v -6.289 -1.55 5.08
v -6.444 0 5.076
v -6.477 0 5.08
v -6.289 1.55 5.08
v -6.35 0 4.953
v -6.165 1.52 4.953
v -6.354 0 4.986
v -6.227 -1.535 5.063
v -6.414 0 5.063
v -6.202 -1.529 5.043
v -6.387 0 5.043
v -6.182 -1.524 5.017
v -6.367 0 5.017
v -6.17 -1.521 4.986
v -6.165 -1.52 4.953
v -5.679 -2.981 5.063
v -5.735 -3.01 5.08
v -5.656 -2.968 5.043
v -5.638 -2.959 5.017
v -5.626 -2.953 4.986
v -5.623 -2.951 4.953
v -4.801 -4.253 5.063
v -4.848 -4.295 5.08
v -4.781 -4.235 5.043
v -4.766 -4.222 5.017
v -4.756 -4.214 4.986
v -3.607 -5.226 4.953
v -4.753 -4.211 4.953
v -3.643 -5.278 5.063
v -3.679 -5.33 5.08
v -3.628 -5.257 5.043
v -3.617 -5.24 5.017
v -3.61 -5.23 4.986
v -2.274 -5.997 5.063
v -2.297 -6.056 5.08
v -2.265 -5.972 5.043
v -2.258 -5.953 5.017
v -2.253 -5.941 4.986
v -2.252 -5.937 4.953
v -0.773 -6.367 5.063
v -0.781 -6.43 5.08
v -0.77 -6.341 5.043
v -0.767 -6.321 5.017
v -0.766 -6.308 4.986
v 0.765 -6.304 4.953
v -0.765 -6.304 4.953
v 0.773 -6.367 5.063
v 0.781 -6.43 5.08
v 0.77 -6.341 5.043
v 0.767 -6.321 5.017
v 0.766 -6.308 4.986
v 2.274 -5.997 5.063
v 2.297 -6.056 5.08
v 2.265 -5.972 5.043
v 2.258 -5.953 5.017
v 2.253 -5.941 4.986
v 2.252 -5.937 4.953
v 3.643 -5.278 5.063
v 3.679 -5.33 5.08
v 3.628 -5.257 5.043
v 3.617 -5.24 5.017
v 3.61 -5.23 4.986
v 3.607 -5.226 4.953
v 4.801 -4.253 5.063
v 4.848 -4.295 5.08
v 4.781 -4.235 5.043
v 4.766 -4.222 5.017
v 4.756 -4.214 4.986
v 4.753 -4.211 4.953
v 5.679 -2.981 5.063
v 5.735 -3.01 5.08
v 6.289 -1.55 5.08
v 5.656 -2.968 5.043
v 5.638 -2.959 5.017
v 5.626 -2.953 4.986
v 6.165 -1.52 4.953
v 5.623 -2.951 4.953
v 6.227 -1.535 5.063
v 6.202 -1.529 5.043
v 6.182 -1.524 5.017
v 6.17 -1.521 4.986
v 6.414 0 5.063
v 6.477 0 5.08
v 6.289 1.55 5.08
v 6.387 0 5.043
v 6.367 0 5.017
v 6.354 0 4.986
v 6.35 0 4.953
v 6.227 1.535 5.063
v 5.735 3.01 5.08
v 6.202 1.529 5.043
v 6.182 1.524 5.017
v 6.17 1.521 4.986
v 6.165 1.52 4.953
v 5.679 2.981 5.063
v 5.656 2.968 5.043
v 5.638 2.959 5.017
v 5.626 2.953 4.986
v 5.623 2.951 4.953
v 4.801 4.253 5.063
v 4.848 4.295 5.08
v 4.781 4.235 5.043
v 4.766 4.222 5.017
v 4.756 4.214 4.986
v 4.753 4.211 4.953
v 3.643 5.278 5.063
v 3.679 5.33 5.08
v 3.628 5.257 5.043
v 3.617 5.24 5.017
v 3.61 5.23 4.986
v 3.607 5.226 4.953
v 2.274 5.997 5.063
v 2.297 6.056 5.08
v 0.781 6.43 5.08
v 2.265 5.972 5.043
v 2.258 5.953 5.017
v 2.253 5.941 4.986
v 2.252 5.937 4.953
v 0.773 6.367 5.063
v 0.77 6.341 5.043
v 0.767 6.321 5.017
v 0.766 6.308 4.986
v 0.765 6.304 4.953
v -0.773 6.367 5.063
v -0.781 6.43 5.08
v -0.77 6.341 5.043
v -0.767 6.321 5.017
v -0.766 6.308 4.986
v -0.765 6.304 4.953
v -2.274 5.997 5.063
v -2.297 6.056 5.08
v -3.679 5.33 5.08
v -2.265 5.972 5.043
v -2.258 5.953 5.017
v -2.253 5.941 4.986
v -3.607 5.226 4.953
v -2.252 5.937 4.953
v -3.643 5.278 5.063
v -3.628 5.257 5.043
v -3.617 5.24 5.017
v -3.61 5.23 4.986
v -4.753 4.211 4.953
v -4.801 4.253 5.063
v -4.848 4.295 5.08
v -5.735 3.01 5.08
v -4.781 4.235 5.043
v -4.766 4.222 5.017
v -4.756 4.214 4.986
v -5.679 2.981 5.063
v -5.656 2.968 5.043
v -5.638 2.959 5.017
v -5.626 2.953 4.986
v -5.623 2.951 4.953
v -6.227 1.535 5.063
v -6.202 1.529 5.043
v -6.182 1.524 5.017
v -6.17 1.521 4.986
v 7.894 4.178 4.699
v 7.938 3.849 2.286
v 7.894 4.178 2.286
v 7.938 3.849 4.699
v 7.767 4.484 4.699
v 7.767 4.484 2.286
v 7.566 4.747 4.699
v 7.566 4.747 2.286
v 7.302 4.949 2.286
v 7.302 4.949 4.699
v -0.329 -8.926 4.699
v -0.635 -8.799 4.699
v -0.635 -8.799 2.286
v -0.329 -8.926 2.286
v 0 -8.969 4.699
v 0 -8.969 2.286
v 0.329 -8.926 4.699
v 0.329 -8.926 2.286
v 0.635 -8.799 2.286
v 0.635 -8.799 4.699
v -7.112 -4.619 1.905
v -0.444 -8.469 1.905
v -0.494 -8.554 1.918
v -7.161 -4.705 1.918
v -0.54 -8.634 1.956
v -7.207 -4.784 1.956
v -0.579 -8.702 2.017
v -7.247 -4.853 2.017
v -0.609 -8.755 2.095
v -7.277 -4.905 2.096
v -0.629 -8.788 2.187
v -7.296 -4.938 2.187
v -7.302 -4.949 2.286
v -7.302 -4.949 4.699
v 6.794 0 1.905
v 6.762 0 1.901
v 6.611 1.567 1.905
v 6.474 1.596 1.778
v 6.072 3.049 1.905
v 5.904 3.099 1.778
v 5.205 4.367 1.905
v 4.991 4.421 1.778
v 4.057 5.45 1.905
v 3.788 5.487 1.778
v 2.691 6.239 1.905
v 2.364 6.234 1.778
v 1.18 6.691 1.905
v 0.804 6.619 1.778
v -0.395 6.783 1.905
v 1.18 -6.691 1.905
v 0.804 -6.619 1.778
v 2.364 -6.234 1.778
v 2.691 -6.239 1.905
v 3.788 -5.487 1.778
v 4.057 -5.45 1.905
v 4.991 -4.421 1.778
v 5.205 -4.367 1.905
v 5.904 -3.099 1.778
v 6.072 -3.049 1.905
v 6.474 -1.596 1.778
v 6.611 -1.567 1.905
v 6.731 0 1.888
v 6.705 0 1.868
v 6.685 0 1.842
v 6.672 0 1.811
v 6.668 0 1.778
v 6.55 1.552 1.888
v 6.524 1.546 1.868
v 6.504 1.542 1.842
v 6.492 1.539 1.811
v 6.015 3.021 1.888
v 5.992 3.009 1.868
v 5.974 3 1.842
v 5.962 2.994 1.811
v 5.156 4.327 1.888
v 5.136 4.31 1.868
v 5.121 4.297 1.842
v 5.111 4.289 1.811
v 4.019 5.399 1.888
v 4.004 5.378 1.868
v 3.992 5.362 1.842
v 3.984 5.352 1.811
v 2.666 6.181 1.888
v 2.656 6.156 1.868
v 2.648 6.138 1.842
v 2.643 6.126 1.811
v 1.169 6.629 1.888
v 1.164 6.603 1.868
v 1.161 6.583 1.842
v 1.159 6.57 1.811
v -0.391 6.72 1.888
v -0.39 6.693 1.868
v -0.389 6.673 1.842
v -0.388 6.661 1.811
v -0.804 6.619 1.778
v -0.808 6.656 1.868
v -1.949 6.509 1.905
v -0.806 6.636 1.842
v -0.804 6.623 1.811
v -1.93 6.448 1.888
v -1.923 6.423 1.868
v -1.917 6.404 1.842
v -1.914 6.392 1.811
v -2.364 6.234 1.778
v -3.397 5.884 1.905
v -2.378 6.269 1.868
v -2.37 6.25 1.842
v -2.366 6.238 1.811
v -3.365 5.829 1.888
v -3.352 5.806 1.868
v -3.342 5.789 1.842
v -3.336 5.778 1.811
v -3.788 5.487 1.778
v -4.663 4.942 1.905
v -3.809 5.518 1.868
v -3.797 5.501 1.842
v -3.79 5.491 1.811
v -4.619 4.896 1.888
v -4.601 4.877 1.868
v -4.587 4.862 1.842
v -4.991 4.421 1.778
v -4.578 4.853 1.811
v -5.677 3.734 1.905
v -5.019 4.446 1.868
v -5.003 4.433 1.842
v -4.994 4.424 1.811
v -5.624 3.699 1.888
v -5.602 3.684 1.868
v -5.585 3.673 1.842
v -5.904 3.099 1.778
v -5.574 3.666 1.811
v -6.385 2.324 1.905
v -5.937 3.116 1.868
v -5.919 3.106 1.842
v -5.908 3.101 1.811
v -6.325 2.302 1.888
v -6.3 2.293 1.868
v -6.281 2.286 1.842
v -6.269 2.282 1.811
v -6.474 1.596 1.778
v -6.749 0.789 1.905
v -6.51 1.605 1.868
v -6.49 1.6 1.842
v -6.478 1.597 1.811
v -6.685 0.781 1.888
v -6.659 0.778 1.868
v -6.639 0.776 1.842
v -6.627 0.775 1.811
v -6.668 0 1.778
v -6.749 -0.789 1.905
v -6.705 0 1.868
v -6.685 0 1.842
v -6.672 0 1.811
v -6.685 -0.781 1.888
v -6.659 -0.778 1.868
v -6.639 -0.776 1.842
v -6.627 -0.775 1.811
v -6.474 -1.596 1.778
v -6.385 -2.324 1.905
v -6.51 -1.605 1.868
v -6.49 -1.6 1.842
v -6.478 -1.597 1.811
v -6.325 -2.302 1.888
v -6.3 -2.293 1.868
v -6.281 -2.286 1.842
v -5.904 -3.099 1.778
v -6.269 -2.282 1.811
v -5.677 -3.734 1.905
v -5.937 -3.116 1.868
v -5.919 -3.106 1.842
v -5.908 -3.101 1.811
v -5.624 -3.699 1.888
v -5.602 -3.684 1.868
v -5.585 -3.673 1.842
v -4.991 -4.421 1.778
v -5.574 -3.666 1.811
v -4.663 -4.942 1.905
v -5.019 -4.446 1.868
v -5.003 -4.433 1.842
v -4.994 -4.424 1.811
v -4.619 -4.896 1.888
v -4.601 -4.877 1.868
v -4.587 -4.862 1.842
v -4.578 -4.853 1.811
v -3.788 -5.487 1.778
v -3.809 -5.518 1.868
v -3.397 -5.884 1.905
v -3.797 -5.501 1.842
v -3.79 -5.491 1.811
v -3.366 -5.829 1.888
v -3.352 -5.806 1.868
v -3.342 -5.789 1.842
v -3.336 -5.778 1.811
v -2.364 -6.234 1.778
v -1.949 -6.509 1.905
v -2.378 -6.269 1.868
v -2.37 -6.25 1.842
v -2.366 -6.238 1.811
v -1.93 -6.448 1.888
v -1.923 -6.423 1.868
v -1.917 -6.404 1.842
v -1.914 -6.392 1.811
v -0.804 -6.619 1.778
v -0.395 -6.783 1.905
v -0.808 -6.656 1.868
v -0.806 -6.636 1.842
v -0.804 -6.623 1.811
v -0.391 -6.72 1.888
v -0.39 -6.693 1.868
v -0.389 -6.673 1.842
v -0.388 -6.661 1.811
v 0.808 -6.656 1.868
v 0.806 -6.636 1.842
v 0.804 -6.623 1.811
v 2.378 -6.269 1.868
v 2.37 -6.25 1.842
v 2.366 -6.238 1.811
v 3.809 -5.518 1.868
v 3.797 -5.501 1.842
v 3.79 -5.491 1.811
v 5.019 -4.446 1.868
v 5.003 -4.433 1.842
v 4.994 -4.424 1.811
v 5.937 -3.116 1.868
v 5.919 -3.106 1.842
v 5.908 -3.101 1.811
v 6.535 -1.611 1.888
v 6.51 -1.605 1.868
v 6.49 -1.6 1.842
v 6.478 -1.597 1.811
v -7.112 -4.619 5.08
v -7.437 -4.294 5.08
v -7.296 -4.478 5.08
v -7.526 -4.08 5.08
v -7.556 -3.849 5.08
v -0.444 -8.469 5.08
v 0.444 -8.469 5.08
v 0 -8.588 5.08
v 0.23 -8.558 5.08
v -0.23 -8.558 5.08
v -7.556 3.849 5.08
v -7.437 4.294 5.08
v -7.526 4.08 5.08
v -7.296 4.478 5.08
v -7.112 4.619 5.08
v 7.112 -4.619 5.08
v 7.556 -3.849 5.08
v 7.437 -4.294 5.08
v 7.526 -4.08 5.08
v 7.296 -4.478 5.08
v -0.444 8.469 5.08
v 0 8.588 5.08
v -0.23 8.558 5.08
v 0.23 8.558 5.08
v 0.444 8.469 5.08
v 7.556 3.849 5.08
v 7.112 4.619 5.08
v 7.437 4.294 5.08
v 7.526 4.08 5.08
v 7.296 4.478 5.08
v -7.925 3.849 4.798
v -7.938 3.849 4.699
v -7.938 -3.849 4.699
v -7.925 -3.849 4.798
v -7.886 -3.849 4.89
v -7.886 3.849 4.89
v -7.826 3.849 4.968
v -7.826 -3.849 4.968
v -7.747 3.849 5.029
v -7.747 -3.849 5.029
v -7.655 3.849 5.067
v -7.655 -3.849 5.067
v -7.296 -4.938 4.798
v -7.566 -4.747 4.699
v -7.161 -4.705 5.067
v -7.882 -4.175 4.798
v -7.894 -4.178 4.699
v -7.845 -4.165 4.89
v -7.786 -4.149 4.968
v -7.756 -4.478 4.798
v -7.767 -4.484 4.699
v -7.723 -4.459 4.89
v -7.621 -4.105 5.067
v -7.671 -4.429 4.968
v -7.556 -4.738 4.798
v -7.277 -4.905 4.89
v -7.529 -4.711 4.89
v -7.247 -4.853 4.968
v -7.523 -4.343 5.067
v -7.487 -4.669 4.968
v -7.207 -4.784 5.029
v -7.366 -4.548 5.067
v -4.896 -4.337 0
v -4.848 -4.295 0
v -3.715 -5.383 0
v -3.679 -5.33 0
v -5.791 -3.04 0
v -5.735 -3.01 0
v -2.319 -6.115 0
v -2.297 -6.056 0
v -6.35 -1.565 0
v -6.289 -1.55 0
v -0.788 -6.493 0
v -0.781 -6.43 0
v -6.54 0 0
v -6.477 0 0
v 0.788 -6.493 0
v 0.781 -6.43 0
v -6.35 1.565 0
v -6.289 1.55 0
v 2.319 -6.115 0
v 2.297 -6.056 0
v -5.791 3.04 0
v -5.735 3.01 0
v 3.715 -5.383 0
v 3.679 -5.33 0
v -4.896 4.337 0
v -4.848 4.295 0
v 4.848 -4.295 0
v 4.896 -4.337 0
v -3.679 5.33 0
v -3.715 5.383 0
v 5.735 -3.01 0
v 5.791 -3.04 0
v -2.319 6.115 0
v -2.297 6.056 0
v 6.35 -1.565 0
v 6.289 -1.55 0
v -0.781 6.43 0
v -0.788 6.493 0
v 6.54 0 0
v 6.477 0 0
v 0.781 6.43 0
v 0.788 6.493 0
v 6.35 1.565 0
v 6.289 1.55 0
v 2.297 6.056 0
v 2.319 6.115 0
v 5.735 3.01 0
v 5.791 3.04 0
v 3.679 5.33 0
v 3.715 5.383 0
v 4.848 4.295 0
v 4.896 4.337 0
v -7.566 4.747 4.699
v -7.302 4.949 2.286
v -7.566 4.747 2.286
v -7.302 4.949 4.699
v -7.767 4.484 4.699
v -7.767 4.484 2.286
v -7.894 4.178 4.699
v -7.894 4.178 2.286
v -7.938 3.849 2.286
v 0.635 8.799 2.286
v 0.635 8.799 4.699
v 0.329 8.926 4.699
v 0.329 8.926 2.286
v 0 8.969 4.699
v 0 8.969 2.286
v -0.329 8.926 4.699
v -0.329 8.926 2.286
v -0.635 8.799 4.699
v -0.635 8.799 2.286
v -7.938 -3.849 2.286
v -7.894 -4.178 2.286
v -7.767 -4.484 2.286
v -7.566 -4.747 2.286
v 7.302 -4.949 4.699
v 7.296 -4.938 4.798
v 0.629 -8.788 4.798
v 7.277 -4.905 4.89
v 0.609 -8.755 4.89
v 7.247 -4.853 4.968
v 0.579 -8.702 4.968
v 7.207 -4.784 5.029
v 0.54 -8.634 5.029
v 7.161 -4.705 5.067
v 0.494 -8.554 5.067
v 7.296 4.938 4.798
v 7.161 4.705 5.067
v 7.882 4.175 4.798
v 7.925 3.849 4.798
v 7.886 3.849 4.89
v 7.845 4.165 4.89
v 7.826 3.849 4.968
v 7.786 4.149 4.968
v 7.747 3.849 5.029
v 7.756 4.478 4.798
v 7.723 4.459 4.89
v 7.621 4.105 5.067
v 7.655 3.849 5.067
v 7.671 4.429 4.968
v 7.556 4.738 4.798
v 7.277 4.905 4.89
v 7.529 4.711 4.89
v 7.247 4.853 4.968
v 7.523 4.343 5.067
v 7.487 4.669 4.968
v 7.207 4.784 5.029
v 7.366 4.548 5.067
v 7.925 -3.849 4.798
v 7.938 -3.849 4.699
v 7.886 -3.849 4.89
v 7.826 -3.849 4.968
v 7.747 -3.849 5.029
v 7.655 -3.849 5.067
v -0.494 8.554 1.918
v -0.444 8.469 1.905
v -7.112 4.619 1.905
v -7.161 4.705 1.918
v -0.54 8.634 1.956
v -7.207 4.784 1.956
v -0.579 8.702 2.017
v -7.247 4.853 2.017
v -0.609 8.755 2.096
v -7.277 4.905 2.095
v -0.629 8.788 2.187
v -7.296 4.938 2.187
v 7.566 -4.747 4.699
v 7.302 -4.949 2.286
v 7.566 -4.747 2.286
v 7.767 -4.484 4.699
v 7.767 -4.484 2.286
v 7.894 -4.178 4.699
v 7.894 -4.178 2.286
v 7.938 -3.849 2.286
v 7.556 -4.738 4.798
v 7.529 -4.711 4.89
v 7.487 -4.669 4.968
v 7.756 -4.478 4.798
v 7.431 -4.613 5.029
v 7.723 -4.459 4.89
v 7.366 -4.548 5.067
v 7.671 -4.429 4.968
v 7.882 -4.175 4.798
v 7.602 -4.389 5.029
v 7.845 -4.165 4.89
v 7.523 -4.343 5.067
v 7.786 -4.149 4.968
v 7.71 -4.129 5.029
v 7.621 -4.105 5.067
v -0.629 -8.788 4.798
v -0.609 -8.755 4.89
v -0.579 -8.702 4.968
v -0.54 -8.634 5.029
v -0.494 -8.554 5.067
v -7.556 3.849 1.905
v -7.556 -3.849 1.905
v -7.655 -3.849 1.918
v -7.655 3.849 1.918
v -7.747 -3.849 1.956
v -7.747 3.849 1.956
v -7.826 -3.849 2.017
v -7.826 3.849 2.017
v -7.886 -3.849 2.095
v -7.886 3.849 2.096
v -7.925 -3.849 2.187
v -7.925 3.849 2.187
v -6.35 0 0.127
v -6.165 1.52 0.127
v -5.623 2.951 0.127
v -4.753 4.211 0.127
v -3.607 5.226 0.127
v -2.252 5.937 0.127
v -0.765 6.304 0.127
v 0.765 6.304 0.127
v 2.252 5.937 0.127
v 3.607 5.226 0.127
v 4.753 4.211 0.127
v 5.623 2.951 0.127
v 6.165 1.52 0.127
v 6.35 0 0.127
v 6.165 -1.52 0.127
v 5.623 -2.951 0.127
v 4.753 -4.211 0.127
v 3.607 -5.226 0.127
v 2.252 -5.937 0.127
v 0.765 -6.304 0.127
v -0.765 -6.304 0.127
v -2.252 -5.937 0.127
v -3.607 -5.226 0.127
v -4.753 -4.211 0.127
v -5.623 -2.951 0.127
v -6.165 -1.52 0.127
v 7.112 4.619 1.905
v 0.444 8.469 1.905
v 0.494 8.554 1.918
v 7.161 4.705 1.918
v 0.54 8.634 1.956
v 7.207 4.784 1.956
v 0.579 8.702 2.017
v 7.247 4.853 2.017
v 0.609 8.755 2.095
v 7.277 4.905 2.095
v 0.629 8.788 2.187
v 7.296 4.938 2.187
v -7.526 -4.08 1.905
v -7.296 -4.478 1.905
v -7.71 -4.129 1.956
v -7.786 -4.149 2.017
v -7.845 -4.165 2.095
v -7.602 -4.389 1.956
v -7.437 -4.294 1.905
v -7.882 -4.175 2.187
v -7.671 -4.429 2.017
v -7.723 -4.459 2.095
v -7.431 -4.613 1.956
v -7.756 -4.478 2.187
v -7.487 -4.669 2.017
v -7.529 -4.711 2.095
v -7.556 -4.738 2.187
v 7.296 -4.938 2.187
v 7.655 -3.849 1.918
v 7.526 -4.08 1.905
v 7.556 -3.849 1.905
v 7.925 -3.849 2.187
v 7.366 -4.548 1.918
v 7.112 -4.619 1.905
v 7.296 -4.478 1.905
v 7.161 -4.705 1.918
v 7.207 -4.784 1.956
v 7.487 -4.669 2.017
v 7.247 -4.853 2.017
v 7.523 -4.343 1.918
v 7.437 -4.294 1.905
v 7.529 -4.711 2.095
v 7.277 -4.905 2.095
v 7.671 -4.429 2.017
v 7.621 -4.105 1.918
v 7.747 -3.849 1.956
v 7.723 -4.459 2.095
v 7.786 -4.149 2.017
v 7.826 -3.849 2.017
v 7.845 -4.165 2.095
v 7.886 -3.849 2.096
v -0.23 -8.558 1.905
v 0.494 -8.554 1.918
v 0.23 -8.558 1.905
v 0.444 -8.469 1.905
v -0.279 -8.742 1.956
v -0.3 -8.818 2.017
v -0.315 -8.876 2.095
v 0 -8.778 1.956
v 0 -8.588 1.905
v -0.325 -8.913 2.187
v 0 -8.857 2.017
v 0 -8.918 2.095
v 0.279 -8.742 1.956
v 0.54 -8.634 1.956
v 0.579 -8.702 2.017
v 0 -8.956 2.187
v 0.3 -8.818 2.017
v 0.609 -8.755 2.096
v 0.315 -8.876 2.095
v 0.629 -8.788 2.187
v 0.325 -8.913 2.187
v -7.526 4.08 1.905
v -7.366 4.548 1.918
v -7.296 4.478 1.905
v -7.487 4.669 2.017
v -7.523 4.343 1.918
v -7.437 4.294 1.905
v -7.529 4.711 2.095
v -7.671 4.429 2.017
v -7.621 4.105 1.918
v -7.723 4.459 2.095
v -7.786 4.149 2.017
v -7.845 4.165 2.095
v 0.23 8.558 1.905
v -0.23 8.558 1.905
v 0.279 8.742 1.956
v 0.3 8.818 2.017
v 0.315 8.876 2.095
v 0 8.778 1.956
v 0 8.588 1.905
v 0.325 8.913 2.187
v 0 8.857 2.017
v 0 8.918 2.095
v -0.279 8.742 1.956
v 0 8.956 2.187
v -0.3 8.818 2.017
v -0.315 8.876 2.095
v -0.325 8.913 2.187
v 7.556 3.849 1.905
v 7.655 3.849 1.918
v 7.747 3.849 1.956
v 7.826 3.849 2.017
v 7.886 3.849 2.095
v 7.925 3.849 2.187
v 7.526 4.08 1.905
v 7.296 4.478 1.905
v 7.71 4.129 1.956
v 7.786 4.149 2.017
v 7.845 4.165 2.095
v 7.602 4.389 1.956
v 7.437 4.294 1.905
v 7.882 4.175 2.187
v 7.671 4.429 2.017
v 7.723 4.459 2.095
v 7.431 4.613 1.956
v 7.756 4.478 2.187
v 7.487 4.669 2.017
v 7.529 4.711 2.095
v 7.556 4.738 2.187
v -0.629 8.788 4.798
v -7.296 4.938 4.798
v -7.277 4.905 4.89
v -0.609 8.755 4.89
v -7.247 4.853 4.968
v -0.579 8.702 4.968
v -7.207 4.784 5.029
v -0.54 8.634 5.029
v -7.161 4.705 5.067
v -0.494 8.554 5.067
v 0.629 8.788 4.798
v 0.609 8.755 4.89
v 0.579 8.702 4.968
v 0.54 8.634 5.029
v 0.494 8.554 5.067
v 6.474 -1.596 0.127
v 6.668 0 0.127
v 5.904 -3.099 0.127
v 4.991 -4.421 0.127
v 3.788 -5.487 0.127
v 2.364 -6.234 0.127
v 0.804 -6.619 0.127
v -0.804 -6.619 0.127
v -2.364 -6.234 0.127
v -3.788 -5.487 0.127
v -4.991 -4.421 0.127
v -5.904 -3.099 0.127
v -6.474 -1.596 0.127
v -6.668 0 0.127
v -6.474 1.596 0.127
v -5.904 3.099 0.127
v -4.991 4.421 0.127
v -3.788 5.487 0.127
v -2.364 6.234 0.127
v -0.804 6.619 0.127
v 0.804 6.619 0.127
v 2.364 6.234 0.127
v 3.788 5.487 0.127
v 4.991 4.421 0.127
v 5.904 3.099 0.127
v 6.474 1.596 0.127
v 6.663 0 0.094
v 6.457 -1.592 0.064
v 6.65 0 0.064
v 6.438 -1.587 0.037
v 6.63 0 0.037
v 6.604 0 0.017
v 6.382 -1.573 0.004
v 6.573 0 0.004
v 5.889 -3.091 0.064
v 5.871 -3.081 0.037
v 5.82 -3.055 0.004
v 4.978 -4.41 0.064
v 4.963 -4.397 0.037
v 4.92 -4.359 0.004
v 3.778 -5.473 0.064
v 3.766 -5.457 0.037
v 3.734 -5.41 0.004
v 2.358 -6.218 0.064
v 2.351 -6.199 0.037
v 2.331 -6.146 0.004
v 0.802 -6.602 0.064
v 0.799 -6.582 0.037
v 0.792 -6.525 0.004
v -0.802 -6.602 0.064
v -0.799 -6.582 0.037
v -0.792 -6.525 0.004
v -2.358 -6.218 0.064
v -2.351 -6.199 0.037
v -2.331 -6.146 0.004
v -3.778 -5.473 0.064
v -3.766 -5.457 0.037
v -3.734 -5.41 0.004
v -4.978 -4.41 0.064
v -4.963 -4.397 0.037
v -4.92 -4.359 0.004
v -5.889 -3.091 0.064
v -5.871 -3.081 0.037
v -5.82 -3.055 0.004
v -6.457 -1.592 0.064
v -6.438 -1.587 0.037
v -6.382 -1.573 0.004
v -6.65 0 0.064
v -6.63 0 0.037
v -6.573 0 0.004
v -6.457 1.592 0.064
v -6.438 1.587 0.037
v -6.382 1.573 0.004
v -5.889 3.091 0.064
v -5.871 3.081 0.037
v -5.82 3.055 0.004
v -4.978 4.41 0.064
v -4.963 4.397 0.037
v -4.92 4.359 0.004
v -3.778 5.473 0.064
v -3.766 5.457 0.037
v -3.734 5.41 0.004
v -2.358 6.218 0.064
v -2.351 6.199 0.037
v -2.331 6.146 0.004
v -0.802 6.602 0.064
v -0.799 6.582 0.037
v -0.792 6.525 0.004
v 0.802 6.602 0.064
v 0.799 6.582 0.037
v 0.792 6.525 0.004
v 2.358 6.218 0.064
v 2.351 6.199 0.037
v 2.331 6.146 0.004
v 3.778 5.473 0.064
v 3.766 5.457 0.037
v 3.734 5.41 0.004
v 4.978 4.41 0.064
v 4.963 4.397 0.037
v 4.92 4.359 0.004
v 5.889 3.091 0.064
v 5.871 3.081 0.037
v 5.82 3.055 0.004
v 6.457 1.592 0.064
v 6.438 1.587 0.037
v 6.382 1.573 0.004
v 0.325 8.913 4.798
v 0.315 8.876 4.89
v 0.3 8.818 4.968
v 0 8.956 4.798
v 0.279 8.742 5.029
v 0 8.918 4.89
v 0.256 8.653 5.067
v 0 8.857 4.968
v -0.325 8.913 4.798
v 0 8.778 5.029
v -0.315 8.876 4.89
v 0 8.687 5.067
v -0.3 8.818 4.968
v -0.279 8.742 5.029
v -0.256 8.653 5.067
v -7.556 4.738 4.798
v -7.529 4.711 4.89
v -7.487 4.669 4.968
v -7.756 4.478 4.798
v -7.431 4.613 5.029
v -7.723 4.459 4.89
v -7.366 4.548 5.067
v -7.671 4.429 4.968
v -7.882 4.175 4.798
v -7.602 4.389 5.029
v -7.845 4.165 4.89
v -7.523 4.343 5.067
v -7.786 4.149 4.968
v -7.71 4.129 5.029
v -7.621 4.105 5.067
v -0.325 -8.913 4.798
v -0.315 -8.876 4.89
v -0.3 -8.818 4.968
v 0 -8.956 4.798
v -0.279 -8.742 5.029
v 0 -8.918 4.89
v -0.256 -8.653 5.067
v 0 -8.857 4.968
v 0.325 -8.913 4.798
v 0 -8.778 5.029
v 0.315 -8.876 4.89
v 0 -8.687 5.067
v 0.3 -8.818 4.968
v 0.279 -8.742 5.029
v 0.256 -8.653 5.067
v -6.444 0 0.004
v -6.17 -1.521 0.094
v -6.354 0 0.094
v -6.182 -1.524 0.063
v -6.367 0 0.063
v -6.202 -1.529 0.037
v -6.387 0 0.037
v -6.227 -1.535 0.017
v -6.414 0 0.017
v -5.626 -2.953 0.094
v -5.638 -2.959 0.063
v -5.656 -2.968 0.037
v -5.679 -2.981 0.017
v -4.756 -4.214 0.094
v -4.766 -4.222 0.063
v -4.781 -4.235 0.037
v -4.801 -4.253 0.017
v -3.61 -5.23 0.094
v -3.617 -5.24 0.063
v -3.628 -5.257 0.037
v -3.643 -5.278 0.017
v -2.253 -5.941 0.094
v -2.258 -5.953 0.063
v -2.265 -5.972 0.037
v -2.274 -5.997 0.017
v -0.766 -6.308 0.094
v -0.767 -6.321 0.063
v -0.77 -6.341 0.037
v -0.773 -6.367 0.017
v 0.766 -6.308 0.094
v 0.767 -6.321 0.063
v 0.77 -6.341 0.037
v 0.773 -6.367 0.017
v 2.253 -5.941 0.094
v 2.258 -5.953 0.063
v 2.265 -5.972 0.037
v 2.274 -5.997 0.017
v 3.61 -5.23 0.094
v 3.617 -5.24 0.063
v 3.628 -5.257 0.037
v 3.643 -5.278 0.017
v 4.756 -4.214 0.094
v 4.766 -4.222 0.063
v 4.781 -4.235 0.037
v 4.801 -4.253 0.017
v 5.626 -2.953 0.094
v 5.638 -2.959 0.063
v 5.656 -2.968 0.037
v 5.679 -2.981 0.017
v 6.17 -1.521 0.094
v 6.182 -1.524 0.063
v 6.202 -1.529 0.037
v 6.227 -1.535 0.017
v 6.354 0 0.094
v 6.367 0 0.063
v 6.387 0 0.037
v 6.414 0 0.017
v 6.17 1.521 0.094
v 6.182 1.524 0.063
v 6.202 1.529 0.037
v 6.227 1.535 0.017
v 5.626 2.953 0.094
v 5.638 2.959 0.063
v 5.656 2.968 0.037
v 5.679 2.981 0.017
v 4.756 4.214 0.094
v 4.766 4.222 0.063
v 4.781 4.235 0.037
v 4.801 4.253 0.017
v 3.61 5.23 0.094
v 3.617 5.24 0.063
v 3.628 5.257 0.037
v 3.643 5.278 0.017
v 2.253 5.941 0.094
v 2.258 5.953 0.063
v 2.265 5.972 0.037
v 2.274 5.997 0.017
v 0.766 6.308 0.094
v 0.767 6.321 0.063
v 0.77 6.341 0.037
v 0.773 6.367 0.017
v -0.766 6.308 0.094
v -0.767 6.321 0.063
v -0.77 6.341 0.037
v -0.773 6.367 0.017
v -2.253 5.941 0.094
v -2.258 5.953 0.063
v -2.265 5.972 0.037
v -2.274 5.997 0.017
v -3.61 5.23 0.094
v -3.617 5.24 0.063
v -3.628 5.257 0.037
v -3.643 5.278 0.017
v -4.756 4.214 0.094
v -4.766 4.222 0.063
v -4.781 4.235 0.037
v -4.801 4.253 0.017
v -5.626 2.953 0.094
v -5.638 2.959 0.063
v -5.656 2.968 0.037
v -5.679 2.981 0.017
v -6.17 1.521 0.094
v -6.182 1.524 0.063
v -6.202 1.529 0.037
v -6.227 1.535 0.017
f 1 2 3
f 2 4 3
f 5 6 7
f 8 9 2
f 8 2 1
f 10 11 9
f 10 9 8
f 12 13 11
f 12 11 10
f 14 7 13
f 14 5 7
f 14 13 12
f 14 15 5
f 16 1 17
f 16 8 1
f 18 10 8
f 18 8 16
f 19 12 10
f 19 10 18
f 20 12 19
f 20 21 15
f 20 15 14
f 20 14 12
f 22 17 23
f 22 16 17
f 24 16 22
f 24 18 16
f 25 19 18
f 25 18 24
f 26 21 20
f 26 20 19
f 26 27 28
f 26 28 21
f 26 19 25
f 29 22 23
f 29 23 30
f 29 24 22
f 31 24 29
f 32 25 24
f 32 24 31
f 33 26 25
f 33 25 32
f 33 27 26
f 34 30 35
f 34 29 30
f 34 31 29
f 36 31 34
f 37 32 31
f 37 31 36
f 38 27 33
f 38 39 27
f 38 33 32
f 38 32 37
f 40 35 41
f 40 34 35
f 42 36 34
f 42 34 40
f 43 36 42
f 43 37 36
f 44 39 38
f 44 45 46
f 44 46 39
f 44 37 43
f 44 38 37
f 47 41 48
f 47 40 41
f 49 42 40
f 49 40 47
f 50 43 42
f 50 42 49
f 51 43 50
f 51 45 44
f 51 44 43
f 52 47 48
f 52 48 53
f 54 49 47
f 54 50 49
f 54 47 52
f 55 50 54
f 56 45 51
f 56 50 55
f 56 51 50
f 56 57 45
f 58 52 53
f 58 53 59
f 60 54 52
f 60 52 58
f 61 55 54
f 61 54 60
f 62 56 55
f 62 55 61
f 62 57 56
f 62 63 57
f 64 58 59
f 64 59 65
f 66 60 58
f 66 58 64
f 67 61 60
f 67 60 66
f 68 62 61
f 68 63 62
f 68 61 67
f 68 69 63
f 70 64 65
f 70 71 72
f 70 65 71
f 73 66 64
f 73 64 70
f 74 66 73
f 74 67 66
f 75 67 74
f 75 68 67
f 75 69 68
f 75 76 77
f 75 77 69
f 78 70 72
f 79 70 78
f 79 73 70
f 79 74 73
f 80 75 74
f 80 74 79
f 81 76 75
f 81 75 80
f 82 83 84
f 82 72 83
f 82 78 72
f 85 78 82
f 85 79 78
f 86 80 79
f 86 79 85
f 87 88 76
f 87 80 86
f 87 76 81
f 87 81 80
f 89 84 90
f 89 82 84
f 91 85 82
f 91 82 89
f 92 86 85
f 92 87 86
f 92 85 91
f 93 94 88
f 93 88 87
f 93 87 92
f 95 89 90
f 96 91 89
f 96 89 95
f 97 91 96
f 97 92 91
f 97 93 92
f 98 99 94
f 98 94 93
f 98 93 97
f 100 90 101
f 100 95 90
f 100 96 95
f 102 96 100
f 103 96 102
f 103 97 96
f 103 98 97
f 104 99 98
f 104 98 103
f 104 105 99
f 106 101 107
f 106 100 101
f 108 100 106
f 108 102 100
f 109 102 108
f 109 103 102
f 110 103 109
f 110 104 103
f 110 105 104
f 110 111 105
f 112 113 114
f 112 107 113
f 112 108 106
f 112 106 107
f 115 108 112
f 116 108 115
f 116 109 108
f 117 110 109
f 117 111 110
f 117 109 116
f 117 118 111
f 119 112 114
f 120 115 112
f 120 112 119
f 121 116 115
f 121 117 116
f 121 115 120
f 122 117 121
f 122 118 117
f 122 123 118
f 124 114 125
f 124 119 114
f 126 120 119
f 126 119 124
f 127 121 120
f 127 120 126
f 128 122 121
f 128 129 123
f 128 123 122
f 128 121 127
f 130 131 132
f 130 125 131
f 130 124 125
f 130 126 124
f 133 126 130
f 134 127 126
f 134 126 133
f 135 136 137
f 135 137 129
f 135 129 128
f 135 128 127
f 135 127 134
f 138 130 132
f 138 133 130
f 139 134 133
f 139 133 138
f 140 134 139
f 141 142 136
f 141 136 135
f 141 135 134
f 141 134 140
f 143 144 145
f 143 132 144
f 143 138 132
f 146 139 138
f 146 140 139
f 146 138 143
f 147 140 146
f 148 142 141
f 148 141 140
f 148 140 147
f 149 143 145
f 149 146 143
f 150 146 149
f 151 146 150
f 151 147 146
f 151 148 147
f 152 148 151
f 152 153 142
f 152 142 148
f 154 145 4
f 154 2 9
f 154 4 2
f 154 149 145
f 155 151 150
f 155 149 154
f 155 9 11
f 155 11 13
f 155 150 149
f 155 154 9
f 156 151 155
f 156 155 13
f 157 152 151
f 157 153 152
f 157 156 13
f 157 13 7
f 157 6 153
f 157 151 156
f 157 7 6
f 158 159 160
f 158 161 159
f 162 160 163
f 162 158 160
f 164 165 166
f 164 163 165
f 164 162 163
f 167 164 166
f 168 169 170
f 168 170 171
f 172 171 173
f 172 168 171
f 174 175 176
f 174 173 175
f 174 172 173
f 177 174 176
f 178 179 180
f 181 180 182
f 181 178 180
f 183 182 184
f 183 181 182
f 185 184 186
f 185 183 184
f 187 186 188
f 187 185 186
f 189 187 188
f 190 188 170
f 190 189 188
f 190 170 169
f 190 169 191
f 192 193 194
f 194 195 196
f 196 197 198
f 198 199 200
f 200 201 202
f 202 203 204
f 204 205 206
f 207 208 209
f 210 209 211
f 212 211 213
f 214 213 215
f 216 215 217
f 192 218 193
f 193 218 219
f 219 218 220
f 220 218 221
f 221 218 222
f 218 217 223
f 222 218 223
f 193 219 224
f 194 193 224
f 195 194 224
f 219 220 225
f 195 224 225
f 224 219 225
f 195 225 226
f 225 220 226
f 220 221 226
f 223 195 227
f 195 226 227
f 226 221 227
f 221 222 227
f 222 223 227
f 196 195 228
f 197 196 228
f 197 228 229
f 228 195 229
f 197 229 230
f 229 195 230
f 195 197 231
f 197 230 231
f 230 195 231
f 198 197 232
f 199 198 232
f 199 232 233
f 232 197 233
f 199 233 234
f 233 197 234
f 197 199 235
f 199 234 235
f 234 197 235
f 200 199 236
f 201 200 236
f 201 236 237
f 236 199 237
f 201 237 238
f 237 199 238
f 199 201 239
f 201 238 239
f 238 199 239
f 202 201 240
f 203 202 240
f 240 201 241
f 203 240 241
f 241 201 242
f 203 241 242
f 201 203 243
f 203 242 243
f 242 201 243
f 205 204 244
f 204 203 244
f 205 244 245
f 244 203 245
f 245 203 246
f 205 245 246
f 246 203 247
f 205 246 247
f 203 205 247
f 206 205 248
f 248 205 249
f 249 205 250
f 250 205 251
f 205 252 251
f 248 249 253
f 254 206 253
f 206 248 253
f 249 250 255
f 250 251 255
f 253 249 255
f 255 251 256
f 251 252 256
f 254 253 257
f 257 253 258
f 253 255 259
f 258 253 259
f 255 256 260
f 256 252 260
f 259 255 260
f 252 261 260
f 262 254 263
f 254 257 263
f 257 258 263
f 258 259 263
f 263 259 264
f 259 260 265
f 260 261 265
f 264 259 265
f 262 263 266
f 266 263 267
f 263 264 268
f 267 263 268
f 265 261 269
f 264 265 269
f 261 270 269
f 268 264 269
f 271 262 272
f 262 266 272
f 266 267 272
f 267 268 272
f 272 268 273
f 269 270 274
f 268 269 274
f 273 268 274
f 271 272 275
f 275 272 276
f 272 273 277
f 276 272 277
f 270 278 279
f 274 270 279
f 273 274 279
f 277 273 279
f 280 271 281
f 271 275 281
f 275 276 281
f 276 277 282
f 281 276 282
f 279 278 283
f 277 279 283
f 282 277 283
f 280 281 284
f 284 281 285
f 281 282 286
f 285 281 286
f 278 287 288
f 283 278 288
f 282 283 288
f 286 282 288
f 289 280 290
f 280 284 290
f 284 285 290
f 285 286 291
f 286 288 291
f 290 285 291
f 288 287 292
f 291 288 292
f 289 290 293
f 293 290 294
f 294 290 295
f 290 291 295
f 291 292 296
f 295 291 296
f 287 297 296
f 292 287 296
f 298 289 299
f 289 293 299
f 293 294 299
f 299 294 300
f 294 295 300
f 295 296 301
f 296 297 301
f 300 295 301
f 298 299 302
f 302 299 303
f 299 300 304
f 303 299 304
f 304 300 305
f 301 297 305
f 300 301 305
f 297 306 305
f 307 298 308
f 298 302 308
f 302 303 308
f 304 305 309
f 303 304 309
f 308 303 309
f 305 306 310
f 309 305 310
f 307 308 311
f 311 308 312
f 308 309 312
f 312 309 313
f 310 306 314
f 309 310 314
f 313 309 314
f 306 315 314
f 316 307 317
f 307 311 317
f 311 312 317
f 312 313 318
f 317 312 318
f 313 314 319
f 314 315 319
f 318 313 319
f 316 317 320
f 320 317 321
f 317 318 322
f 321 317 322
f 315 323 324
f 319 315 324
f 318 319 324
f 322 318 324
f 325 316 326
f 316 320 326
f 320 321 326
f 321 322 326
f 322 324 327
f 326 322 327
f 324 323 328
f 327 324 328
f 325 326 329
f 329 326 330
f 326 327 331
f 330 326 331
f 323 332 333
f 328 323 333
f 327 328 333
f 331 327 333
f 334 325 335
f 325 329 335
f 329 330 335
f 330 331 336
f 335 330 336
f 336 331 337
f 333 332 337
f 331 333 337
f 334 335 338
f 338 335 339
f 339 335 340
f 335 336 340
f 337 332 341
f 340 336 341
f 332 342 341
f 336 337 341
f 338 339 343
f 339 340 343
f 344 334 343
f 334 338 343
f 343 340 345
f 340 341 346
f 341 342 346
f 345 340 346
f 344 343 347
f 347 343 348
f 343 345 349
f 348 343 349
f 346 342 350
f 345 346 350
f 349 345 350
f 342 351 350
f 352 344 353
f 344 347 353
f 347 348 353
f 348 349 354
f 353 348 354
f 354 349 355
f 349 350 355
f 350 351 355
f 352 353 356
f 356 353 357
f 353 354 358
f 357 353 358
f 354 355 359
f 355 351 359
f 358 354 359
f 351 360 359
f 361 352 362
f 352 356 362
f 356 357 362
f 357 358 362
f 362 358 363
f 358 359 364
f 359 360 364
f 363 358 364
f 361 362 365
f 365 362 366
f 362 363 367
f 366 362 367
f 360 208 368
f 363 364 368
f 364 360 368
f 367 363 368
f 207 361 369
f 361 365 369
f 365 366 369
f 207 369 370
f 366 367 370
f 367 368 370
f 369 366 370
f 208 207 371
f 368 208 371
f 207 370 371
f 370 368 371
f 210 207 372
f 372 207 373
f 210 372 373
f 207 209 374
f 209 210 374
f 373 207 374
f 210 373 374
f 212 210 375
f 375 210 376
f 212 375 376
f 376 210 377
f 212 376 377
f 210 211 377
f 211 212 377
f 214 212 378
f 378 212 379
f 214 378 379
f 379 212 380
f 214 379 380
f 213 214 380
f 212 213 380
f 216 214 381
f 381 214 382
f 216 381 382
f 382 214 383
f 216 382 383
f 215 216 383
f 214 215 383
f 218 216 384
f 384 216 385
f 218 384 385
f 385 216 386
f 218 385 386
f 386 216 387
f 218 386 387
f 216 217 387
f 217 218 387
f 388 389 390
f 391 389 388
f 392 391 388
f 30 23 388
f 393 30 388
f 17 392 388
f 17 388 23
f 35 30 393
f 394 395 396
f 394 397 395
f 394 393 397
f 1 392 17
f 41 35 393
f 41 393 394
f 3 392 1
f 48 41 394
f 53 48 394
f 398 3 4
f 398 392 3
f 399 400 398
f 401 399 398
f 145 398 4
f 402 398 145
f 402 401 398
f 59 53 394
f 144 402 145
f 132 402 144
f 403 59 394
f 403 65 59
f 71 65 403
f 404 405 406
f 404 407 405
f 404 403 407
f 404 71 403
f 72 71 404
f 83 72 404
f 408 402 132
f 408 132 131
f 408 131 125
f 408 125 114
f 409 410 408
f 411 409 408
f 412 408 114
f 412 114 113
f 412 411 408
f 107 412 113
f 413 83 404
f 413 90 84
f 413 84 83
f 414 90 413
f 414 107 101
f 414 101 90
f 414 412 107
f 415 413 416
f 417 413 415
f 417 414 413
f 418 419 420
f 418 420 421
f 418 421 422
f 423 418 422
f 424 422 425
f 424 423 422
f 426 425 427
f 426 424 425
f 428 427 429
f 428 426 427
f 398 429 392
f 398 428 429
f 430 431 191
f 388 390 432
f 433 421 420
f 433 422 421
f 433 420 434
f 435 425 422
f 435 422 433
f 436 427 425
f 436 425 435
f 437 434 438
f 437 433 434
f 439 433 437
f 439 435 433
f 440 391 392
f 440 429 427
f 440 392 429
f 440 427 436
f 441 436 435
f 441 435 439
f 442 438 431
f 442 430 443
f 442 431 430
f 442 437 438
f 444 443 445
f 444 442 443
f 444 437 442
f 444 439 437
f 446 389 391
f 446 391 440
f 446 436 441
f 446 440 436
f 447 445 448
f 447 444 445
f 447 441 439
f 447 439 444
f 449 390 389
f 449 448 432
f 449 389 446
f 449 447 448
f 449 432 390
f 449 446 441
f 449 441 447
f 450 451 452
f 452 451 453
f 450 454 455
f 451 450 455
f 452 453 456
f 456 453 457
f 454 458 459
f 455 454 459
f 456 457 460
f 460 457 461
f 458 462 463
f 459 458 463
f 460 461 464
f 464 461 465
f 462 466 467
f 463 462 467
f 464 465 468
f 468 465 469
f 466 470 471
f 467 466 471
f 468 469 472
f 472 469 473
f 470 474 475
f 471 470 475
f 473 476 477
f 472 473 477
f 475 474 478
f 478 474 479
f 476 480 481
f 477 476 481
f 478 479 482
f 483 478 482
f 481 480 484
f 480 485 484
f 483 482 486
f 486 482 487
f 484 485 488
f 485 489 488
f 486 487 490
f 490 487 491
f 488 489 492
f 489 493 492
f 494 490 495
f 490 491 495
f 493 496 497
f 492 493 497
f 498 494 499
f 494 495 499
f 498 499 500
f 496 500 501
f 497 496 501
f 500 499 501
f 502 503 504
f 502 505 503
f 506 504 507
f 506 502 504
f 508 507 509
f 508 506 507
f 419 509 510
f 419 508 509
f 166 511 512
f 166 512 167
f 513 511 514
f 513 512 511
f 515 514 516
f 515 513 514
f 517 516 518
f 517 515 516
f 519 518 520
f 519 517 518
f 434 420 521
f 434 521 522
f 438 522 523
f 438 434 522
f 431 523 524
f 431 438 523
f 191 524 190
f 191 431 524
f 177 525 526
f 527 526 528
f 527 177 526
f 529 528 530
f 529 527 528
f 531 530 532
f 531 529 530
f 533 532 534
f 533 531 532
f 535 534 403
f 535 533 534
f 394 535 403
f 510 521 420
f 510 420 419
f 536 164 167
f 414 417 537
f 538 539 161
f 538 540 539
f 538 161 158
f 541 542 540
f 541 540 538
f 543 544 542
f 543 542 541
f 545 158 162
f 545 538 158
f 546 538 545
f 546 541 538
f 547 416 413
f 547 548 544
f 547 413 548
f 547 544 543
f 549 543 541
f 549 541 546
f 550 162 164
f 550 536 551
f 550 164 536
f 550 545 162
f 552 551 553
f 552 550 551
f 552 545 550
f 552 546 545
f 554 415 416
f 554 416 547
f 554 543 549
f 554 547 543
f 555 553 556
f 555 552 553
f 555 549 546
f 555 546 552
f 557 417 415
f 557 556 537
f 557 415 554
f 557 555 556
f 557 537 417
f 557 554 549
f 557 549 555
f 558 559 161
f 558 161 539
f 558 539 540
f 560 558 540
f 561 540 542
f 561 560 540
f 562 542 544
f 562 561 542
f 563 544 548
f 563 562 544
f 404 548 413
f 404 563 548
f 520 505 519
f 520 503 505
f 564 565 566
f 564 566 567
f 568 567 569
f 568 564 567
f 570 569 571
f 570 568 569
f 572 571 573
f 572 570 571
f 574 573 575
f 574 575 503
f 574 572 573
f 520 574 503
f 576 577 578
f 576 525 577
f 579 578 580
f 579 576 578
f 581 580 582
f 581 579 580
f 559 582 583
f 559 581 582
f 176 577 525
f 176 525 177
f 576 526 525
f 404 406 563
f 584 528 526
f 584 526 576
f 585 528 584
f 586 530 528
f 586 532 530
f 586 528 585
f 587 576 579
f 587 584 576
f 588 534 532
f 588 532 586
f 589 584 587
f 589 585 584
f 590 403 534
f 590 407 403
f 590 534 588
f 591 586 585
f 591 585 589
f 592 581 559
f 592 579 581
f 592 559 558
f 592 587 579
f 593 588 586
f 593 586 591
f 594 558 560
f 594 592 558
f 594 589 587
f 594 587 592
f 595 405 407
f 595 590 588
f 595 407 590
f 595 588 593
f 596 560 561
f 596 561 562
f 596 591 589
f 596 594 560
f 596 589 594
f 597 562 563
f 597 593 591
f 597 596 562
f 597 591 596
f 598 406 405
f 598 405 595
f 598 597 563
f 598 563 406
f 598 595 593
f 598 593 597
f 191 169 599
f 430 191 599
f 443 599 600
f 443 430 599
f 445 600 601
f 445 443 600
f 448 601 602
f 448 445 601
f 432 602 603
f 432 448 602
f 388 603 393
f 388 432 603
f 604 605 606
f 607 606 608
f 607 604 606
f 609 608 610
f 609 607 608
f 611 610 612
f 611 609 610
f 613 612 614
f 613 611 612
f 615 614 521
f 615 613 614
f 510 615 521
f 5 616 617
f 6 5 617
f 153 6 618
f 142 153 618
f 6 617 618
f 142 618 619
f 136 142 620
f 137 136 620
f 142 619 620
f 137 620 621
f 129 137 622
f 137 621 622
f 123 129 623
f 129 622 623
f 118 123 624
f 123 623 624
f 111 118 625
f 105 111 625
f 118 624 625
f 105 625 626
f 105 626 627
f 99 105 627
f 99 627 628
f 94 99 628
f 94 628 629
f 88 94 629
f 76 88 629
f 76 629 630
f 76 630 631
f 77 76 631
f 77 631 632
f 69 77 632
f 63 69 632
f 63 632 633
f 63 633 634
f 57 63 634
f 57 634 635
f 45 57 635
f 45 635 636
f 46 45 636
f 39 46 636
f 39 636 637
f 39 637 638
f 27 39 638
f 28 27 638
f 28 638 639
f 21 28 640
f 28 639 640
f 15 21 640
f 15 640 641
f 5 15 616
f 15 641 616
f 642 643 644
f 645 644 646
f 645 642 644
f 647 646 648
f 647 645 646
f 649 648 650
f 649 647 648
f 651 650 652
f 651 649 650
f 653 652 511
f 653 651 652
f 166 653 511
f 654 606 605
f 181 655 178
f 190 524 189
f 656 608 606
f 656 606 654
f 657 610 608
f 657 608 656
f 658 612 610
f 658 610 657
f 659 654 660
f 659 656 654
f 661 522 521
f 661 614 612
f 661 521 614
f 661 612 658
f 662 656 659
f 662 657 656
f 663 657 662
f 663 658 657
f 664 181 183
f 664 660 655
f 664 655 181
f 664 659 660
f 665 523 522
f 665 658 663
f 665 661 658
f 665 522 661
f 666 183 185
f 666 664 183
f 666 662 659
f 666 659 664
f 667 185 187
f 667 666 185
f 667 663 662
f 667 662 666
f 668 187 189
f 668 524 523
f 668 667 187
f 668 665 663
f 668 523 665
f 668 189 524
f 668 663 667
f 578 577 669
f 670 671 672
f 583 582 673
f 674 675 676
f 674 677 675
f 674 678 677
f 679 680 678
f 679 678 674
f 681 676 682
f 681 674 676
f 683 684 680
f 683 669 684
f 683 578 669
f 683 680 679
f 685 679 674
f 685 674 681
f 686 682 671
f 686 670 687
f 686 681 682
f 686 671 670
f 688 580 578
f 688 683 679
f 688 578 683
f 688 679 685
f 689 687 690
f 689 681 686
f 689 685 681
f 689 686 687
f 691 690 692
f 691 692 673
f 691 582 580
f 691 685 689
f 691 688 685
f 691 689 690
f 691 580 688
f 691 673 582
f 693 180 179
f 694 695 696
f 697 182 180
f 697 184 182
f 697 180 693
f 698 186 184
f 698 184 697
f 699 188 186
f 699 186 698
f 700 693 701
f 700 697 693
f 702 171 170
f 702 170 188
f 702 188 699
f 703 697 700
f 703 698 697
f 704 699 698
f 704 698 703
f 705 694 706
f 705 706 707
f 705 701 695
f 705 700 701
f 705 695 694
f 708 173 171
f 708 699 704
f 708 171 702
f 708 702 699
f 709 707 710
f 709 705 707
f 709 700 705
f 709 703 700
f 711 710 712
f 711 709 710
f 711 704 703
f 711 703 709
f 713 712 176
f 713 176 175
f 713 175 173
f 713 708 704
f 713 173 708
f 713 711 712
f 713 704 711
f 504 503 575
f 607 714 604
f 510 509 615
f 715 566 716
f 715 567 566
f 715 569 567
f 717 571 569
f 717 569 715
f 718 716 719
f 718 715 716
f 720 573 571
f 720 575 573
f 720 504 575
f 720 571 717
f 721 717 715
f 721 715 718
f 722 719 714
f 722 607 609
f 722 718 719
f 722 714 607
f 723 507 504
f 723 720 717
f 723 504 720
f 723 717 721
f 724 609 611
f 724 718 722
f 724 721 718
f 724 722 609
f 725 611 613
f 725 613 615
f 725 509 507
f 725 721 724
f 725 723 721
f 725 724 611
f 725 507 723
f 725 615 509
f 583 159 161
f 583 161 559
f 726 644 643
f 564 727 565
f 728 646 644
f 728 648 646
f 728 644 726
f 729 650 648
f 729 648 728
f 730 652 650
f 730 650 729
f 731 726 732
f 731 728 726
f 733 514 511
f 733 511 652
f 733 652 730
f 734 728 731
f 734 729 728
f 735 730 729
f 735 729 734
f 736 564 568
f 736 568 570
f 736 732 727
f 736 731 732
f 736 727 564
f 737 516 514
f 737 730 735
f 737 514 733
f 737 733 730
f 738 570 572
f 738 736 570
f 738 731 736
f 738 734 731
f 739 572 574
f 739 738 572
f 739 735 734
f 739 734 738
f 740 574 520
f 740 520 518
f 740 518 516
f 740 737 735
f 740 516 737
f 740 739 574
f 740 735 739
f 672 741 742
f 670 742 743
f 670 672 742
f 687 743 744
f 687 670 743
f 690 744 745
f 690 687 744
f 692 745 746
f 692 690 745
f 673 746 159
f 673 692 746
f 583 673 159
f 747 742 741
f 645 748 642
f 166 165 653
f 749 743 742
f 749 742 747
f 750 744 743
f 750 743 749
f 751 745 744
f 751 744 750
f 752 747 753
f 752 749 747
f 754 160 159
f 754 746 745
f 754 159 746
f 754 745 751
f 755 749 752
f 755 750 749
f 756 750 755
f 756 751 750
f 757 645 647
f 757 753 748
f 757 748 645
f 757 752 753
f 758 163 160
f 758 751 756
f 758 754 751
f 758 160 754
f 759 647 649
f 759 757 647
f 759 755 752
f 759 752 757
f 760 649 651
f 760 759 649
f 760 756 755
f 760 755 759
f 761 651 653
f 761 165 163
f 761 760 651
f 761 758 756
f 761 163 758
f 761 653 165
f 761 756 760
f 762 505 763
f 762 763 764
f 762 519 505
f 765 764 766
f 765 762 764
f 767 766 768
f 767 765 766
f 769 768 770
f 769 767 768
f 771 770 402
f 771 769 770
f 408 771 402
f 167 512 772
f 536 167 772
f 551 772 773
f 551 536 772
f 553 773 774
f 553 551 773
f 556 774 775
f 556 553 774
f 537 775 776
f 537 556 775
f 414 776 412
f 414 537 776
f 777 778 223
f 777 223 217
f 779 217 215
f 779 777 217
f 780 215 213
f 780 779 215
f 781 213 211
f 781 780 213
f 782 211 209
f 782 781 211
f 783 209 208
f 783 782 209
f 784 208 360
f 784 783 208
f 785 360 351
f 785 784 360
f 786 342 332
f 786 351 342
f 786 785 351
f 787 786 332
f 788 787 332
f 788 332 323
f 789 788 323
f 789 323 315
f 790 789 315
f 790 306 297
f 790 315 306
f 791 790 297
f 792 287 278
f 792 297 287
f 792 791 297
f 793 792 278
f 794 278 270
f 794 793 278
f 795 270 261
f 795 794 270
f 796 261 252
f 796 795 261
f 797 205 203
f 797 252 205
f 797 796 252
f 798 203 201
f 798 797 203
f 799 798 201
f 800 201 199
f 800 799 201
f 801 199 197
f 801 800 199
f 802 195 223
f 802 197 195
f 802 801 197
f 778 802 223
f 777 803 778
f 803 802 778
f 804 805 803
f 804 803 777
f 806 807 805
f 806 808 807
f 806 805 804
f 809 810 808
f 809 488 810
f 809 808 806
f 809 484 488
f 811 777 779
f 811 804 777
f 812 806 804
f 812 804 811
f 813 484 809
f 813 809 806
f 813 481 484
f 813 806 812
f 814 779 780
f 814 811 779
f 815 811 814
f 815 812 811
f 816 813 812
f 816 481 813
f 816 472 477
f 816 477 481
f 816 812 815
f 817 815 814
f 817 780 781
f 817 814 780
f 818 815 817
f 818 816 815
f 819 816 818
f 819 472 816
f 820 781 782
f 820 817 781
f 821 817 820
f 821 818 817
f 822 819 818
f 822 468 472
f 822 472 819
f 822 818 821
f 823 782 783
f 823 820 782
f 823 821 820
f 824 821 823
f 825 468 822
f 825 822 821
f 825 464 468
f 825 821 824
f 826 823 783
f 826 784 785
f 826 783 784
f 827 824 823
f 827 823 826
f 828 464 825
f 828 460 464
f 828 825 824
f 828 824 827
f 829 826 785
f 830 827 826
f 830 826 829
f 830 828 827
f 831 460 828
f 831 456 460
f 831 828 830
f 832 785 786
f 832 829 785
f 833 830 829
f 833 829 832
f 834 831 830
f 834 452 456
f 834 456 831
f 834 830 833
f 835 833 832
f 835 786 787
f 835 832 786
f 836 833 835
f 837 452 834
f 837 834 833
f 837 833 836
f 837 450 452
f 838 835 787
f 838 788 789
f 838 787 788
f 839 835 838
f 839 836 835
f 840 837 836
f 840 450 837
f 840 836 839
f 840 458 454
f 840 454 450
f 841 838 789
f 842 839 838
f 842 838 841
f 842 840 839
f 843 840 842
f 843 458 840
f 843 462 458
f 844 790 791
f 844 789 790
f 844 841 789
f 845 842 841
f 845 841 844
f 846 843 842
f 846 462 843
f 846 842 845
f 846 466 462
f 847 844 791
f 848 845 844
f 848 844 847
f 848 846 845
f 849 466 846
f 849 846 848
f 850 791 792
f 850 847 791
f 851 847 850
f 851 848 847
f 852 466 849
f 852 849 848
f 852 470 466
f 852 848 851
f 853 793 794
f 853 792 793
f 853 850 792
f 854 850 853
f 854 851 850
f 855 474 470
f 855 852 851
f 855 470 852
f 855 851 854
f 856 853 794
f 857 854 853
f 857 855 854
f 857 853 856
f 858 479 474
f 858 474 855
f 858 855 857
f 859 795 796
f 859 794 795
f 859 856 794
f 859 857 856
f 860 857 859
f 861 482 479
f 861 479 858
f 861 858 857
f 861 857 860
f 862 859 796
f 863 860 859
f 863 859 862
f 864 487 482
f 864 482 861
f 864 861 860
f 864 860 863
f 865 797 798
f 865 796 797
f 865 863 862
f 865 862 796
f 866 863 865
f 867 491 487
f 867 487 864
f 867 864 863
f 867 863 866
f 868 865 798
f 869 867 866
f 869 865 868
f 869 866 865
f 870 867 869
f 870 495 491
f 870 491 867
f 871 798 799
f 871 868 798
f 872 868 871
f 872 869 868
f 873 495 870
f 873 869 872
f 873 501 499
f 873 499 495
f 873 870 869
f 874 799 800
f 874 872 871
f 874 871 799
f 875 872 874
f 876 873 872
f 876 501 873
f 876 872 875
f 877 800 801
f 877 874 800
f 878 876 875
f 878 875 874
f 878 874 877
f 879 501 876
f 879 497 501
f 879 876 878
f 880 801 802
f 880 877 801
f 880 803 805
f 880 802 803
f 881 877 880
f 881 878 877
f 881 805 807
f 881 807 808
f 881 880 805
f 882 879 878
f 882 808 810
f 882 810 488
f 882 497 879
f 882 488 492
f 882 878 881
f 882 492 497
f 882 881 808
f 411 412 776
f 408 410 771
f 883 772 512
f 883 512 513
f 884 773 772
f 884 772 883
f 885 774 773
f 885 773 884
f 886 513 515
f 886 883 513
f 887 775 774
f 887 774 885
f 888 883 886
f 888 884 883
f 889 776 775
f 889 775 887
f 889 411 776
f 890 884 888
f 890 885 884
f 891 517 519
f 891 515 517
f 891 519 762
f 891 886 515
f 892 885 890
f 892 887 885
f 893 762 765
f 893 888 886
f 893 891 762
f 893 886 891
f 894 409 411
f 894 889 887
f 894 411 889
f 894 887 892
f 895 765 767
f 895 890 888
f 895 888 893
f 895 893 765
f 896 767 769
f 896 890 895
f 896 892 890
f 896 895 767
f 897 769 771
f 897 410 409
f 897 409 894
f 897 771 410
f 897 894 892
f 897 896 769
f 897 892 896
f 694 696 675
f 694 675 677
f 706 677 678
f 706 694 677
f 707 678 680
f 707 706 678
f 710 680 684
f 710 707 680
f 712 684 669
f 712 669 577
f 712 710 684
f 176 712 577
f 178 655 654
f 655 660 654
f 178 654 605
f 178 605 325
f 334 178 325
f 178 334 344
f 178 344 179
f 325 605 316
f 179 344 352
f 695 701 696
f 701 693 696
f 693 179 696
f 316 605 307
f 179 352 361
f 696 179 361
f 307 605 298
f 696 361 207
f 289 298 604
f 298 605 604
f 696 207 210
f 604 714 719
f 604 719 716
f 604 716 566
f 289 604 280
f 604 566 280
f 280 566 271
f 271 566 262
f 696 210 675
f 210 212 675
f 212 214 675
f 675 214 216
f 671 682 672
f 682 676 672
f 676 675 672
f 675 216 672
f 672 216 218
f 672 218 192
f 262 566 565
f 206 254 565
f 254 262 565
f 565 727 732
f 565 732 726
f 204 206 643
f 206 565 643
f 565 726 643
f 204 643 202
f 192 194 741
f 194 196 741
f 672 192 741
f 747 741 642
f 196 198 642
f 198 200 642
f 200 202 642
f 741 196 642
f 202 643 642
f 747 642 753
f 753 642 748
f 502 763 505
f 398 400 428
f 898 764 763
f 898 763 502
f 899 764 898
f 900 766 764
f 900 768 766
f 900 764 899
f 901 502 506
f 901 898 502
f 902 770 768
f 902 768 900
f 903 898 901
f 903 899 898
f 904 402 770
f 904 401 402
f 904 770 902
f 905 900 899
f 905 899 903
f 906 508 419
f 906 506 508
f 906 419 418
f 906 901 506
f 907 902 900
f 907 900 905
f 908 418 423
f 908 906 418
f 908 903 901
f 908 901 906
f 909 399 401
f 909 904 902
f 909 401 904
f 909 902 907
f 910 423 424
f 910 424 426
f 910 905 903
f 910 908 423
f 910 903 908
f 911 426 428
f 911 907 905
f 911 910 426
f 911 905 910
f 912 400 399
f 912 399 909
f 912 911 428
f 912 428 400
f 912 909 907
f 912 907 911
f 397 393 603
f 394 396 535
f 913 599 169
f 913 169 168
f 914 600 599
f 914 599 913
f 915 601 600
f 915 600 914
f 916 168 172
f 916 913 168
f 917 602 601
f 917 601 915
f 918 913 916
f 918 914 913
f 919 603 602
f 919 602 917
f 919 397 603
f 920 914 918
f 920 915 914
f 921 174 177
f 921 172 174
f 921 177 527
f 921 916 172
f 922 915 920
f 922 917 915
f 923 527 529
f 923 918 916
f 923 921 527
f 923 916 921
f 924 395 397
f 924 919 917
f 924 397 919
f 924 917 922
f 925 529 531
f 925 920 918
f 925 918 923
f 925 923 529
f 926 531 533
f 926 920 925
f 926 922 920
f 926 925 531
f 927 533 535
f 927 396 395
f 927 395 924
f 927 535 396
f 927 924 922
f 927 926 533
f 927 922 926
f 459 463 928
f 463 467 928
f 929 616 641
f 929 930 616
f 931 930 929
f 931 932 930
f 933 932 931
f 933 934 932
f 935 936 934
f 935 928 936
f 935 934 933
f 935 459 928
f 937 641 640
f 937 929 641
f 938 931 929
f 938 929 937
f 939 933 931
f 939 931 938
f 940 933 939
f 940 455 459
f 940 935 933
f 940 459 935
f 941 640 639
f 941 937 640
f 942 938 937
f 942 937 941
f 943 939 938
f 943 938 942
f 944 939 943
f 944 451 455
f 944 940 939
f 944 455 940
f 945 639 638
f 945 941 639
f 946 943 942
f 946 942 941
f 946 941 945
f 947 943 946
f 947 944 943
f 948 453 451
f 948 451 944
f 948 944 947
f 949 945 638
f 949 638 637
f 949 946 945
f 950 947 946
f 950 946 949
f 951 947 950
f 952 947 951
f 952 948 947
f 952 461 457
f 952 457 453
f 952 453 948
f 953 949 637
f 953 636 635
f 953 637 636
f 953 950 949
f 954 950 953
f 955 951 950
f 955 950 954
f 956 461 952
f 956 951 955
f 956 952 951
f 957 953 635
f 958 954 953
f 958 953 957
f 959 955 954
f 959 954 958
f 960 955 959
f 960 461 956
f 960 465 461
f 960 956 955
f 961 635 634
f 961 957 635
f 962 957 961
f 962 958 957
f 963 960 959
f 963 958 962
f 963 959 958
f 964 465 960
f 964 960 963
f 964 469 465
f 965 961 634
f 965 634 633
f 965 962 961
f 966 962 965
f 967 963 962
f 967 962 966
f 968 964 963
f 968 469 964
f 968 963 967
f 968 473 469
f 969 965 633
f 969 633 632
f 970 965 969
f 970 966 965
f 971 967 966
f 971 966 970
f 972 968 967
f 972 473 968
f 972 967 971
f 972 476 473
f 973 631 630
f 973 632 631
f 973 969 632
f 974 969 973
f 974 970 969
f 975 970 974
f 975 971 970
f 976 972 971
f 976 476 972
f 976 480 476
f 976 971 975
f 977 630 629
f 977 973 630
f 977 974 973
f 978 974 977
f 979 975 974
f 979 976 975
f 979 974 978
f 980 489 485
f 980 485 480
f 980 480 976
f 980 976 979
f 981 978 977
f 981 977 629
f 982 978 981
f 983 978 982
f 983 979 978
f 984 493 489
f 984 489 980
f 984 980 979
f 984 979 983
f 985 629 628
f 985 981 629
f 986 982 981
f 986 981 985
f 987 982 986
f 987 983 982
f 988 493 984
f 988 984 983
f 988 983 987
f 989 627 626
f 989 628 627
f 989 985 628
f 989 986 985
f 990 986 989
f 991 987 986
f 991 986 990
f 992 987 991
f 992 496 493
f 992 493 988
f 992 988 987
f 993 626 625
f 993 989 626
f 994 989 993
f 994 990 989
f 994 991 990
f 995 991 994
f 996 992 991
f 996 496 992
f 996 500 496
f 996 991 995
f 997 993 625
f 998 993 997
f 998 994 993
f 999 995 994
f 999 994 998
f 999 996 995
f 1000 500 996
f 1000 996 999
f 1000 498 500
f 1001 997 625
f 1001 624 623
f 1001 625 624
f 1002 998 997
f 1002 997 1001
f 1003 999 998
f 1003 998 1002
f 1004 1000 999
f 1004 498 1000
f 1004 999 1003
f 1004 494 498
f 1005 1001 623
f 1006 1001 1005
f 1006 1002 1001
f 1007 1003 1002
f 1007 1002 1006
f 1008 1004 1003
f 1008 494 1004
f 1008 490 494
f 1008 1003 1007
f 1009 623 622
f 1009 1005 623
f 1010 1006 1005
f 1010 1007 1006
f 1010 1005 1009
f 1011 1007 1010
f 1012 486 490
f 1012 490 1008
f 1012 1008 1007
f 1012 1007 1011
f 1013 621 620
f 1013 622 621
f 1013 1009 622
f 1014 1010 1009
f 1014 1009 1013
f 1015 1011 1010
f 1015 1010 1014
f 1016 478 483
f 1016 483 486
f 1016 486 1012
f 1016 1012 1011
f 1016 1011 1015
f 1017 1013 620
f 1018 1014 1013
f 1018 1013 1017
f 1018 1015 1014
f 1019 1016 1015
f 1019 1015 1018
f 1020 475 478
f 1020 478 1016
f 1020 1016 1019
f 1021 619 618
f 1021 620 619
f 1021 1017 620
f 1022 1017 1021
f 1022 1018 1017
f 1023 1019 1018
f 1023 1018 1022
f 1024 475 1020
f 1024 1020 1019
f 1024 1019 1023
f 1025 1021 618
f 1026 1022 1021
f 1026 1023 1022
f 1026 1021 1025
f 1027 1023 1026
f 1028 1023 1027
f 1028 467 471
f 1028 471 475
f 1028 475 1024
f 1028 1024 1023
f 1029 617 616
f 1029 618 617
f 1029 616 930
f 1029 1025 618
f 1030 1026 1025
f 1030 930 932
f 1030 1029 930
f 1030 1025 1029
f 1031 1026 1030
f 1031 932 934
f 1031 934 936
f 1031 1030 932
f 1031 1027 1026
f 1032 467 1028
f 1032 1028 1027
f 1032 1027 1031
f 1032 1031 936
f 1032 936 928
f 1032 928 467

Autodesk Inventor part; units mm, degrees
ref_plane "YZ Plane" through (0, 0, 0) normal (1, 0, 0) x (0, 1, 0)
ref_plane "XZ Plane" through (0, 0, 0) normal (0, 1, 0) x (-1, 0, 0)
ref_plane "XY Plane" through (0, 0, 0) normal (0, 0, 1) x (1, 0, 0)
sketch "Sketch1" plane through (0, 0, 0) normal (0, 0, 1) x (1, 0, 0)
  circle A0 centre (0, 0) radius 6.6675
  dimension "d0" = 13.335
extrude "Extrusion1" add sketch "Sketch1" along normal blind 1.905
sketch "Sketch2" plane through (0, 0, 1.905) normal (0, 0, 1) x (1, 0, 0)
  line L0 (-7.9375, 4.5827) -> (0, 9.1654)
  line L1 (0, 9.1654) -> (7.9375, 4.5827)
  line L2 (7.9375, 4.5827) -> (7.9375, -4.5827)
  line L3 (7.9375, -4.5827) -> (0, -9.1654)
  line L4 (0, -9.1654) -> (-7.9375, -4.5827)
  line L5 (-7.9375, -4.5827) -> (-7.9375, 4.5827)
  point P0 (0, 0)
  point P1 (0, 0)
  dimension "d3" = 15.875
extrude "Extrusion2" add sketch "Sketch2" along normal blind 3.175
sketch "Sketch3" plane through (0, 0, 0) normal (0, 0, -1) x (-1, 0, 0)
  circle A0 centre (0, 0) radius 6.35
  dimension "d6" = 12.7
extrude "Extrusion3" cut sketch "Sketch3" against normal through all
fillet "Fillet1" radius 1.27 6 edges at (0, 9.1654, 3.4925) (7.9375, 4.5827, 3.4925) (7.9375, -4.5827, 3.4925) (0, -9.1654, 3.4925) (-7.9375, 4.5827, 3.4925) (-7.9375, -4.5827, 3.4925)
fillet "Fillet2" radius 0.381 24 edges at (7.7674, 4.4845, 1.905) (7.9375, 0, 1.905) (7.7674, -4.4845, 1.905) (3.9688, -6.8741, 1.905) (0, -8.969, 1.905) (-3.9687, -6.8741, 1.905) (-7.7674, -4.4845, 1.905) (-7.9375, 0, 1.905) (-7.7674, 4.4845, 1.905) (-3.9688, 6.8741, 1.905) (0, 8.969, 1.905) (3.9687, 6.8741, 1.905) (0, 8.969, 5.08) (-3.9688, 6.8741, 5.08) (-7.7674, 4.4845, 5.08) (-7.9375, 0, 5.08) (-7.7674, -4.4845, 5.08) (-3.9687, -6.8741, 5.08) (0, -8.969, 5.08) (3.9688, -6.8741, 5.08) (7.7674, -4.4845, 5.08) (7.9375, 0, 5.08) (7.7674, 4.4845, 5.08) (3.9687, 6.8741, 5.08)
fillet "Fillet3" radius 0.127 4 edges at (6.35, 0, 5.08) (-6.6675, 0, 1.905) (-6.6675, 0, 0) (6.35, 0, 0)
properties part number "Shock Spring Adjustment Nut"
